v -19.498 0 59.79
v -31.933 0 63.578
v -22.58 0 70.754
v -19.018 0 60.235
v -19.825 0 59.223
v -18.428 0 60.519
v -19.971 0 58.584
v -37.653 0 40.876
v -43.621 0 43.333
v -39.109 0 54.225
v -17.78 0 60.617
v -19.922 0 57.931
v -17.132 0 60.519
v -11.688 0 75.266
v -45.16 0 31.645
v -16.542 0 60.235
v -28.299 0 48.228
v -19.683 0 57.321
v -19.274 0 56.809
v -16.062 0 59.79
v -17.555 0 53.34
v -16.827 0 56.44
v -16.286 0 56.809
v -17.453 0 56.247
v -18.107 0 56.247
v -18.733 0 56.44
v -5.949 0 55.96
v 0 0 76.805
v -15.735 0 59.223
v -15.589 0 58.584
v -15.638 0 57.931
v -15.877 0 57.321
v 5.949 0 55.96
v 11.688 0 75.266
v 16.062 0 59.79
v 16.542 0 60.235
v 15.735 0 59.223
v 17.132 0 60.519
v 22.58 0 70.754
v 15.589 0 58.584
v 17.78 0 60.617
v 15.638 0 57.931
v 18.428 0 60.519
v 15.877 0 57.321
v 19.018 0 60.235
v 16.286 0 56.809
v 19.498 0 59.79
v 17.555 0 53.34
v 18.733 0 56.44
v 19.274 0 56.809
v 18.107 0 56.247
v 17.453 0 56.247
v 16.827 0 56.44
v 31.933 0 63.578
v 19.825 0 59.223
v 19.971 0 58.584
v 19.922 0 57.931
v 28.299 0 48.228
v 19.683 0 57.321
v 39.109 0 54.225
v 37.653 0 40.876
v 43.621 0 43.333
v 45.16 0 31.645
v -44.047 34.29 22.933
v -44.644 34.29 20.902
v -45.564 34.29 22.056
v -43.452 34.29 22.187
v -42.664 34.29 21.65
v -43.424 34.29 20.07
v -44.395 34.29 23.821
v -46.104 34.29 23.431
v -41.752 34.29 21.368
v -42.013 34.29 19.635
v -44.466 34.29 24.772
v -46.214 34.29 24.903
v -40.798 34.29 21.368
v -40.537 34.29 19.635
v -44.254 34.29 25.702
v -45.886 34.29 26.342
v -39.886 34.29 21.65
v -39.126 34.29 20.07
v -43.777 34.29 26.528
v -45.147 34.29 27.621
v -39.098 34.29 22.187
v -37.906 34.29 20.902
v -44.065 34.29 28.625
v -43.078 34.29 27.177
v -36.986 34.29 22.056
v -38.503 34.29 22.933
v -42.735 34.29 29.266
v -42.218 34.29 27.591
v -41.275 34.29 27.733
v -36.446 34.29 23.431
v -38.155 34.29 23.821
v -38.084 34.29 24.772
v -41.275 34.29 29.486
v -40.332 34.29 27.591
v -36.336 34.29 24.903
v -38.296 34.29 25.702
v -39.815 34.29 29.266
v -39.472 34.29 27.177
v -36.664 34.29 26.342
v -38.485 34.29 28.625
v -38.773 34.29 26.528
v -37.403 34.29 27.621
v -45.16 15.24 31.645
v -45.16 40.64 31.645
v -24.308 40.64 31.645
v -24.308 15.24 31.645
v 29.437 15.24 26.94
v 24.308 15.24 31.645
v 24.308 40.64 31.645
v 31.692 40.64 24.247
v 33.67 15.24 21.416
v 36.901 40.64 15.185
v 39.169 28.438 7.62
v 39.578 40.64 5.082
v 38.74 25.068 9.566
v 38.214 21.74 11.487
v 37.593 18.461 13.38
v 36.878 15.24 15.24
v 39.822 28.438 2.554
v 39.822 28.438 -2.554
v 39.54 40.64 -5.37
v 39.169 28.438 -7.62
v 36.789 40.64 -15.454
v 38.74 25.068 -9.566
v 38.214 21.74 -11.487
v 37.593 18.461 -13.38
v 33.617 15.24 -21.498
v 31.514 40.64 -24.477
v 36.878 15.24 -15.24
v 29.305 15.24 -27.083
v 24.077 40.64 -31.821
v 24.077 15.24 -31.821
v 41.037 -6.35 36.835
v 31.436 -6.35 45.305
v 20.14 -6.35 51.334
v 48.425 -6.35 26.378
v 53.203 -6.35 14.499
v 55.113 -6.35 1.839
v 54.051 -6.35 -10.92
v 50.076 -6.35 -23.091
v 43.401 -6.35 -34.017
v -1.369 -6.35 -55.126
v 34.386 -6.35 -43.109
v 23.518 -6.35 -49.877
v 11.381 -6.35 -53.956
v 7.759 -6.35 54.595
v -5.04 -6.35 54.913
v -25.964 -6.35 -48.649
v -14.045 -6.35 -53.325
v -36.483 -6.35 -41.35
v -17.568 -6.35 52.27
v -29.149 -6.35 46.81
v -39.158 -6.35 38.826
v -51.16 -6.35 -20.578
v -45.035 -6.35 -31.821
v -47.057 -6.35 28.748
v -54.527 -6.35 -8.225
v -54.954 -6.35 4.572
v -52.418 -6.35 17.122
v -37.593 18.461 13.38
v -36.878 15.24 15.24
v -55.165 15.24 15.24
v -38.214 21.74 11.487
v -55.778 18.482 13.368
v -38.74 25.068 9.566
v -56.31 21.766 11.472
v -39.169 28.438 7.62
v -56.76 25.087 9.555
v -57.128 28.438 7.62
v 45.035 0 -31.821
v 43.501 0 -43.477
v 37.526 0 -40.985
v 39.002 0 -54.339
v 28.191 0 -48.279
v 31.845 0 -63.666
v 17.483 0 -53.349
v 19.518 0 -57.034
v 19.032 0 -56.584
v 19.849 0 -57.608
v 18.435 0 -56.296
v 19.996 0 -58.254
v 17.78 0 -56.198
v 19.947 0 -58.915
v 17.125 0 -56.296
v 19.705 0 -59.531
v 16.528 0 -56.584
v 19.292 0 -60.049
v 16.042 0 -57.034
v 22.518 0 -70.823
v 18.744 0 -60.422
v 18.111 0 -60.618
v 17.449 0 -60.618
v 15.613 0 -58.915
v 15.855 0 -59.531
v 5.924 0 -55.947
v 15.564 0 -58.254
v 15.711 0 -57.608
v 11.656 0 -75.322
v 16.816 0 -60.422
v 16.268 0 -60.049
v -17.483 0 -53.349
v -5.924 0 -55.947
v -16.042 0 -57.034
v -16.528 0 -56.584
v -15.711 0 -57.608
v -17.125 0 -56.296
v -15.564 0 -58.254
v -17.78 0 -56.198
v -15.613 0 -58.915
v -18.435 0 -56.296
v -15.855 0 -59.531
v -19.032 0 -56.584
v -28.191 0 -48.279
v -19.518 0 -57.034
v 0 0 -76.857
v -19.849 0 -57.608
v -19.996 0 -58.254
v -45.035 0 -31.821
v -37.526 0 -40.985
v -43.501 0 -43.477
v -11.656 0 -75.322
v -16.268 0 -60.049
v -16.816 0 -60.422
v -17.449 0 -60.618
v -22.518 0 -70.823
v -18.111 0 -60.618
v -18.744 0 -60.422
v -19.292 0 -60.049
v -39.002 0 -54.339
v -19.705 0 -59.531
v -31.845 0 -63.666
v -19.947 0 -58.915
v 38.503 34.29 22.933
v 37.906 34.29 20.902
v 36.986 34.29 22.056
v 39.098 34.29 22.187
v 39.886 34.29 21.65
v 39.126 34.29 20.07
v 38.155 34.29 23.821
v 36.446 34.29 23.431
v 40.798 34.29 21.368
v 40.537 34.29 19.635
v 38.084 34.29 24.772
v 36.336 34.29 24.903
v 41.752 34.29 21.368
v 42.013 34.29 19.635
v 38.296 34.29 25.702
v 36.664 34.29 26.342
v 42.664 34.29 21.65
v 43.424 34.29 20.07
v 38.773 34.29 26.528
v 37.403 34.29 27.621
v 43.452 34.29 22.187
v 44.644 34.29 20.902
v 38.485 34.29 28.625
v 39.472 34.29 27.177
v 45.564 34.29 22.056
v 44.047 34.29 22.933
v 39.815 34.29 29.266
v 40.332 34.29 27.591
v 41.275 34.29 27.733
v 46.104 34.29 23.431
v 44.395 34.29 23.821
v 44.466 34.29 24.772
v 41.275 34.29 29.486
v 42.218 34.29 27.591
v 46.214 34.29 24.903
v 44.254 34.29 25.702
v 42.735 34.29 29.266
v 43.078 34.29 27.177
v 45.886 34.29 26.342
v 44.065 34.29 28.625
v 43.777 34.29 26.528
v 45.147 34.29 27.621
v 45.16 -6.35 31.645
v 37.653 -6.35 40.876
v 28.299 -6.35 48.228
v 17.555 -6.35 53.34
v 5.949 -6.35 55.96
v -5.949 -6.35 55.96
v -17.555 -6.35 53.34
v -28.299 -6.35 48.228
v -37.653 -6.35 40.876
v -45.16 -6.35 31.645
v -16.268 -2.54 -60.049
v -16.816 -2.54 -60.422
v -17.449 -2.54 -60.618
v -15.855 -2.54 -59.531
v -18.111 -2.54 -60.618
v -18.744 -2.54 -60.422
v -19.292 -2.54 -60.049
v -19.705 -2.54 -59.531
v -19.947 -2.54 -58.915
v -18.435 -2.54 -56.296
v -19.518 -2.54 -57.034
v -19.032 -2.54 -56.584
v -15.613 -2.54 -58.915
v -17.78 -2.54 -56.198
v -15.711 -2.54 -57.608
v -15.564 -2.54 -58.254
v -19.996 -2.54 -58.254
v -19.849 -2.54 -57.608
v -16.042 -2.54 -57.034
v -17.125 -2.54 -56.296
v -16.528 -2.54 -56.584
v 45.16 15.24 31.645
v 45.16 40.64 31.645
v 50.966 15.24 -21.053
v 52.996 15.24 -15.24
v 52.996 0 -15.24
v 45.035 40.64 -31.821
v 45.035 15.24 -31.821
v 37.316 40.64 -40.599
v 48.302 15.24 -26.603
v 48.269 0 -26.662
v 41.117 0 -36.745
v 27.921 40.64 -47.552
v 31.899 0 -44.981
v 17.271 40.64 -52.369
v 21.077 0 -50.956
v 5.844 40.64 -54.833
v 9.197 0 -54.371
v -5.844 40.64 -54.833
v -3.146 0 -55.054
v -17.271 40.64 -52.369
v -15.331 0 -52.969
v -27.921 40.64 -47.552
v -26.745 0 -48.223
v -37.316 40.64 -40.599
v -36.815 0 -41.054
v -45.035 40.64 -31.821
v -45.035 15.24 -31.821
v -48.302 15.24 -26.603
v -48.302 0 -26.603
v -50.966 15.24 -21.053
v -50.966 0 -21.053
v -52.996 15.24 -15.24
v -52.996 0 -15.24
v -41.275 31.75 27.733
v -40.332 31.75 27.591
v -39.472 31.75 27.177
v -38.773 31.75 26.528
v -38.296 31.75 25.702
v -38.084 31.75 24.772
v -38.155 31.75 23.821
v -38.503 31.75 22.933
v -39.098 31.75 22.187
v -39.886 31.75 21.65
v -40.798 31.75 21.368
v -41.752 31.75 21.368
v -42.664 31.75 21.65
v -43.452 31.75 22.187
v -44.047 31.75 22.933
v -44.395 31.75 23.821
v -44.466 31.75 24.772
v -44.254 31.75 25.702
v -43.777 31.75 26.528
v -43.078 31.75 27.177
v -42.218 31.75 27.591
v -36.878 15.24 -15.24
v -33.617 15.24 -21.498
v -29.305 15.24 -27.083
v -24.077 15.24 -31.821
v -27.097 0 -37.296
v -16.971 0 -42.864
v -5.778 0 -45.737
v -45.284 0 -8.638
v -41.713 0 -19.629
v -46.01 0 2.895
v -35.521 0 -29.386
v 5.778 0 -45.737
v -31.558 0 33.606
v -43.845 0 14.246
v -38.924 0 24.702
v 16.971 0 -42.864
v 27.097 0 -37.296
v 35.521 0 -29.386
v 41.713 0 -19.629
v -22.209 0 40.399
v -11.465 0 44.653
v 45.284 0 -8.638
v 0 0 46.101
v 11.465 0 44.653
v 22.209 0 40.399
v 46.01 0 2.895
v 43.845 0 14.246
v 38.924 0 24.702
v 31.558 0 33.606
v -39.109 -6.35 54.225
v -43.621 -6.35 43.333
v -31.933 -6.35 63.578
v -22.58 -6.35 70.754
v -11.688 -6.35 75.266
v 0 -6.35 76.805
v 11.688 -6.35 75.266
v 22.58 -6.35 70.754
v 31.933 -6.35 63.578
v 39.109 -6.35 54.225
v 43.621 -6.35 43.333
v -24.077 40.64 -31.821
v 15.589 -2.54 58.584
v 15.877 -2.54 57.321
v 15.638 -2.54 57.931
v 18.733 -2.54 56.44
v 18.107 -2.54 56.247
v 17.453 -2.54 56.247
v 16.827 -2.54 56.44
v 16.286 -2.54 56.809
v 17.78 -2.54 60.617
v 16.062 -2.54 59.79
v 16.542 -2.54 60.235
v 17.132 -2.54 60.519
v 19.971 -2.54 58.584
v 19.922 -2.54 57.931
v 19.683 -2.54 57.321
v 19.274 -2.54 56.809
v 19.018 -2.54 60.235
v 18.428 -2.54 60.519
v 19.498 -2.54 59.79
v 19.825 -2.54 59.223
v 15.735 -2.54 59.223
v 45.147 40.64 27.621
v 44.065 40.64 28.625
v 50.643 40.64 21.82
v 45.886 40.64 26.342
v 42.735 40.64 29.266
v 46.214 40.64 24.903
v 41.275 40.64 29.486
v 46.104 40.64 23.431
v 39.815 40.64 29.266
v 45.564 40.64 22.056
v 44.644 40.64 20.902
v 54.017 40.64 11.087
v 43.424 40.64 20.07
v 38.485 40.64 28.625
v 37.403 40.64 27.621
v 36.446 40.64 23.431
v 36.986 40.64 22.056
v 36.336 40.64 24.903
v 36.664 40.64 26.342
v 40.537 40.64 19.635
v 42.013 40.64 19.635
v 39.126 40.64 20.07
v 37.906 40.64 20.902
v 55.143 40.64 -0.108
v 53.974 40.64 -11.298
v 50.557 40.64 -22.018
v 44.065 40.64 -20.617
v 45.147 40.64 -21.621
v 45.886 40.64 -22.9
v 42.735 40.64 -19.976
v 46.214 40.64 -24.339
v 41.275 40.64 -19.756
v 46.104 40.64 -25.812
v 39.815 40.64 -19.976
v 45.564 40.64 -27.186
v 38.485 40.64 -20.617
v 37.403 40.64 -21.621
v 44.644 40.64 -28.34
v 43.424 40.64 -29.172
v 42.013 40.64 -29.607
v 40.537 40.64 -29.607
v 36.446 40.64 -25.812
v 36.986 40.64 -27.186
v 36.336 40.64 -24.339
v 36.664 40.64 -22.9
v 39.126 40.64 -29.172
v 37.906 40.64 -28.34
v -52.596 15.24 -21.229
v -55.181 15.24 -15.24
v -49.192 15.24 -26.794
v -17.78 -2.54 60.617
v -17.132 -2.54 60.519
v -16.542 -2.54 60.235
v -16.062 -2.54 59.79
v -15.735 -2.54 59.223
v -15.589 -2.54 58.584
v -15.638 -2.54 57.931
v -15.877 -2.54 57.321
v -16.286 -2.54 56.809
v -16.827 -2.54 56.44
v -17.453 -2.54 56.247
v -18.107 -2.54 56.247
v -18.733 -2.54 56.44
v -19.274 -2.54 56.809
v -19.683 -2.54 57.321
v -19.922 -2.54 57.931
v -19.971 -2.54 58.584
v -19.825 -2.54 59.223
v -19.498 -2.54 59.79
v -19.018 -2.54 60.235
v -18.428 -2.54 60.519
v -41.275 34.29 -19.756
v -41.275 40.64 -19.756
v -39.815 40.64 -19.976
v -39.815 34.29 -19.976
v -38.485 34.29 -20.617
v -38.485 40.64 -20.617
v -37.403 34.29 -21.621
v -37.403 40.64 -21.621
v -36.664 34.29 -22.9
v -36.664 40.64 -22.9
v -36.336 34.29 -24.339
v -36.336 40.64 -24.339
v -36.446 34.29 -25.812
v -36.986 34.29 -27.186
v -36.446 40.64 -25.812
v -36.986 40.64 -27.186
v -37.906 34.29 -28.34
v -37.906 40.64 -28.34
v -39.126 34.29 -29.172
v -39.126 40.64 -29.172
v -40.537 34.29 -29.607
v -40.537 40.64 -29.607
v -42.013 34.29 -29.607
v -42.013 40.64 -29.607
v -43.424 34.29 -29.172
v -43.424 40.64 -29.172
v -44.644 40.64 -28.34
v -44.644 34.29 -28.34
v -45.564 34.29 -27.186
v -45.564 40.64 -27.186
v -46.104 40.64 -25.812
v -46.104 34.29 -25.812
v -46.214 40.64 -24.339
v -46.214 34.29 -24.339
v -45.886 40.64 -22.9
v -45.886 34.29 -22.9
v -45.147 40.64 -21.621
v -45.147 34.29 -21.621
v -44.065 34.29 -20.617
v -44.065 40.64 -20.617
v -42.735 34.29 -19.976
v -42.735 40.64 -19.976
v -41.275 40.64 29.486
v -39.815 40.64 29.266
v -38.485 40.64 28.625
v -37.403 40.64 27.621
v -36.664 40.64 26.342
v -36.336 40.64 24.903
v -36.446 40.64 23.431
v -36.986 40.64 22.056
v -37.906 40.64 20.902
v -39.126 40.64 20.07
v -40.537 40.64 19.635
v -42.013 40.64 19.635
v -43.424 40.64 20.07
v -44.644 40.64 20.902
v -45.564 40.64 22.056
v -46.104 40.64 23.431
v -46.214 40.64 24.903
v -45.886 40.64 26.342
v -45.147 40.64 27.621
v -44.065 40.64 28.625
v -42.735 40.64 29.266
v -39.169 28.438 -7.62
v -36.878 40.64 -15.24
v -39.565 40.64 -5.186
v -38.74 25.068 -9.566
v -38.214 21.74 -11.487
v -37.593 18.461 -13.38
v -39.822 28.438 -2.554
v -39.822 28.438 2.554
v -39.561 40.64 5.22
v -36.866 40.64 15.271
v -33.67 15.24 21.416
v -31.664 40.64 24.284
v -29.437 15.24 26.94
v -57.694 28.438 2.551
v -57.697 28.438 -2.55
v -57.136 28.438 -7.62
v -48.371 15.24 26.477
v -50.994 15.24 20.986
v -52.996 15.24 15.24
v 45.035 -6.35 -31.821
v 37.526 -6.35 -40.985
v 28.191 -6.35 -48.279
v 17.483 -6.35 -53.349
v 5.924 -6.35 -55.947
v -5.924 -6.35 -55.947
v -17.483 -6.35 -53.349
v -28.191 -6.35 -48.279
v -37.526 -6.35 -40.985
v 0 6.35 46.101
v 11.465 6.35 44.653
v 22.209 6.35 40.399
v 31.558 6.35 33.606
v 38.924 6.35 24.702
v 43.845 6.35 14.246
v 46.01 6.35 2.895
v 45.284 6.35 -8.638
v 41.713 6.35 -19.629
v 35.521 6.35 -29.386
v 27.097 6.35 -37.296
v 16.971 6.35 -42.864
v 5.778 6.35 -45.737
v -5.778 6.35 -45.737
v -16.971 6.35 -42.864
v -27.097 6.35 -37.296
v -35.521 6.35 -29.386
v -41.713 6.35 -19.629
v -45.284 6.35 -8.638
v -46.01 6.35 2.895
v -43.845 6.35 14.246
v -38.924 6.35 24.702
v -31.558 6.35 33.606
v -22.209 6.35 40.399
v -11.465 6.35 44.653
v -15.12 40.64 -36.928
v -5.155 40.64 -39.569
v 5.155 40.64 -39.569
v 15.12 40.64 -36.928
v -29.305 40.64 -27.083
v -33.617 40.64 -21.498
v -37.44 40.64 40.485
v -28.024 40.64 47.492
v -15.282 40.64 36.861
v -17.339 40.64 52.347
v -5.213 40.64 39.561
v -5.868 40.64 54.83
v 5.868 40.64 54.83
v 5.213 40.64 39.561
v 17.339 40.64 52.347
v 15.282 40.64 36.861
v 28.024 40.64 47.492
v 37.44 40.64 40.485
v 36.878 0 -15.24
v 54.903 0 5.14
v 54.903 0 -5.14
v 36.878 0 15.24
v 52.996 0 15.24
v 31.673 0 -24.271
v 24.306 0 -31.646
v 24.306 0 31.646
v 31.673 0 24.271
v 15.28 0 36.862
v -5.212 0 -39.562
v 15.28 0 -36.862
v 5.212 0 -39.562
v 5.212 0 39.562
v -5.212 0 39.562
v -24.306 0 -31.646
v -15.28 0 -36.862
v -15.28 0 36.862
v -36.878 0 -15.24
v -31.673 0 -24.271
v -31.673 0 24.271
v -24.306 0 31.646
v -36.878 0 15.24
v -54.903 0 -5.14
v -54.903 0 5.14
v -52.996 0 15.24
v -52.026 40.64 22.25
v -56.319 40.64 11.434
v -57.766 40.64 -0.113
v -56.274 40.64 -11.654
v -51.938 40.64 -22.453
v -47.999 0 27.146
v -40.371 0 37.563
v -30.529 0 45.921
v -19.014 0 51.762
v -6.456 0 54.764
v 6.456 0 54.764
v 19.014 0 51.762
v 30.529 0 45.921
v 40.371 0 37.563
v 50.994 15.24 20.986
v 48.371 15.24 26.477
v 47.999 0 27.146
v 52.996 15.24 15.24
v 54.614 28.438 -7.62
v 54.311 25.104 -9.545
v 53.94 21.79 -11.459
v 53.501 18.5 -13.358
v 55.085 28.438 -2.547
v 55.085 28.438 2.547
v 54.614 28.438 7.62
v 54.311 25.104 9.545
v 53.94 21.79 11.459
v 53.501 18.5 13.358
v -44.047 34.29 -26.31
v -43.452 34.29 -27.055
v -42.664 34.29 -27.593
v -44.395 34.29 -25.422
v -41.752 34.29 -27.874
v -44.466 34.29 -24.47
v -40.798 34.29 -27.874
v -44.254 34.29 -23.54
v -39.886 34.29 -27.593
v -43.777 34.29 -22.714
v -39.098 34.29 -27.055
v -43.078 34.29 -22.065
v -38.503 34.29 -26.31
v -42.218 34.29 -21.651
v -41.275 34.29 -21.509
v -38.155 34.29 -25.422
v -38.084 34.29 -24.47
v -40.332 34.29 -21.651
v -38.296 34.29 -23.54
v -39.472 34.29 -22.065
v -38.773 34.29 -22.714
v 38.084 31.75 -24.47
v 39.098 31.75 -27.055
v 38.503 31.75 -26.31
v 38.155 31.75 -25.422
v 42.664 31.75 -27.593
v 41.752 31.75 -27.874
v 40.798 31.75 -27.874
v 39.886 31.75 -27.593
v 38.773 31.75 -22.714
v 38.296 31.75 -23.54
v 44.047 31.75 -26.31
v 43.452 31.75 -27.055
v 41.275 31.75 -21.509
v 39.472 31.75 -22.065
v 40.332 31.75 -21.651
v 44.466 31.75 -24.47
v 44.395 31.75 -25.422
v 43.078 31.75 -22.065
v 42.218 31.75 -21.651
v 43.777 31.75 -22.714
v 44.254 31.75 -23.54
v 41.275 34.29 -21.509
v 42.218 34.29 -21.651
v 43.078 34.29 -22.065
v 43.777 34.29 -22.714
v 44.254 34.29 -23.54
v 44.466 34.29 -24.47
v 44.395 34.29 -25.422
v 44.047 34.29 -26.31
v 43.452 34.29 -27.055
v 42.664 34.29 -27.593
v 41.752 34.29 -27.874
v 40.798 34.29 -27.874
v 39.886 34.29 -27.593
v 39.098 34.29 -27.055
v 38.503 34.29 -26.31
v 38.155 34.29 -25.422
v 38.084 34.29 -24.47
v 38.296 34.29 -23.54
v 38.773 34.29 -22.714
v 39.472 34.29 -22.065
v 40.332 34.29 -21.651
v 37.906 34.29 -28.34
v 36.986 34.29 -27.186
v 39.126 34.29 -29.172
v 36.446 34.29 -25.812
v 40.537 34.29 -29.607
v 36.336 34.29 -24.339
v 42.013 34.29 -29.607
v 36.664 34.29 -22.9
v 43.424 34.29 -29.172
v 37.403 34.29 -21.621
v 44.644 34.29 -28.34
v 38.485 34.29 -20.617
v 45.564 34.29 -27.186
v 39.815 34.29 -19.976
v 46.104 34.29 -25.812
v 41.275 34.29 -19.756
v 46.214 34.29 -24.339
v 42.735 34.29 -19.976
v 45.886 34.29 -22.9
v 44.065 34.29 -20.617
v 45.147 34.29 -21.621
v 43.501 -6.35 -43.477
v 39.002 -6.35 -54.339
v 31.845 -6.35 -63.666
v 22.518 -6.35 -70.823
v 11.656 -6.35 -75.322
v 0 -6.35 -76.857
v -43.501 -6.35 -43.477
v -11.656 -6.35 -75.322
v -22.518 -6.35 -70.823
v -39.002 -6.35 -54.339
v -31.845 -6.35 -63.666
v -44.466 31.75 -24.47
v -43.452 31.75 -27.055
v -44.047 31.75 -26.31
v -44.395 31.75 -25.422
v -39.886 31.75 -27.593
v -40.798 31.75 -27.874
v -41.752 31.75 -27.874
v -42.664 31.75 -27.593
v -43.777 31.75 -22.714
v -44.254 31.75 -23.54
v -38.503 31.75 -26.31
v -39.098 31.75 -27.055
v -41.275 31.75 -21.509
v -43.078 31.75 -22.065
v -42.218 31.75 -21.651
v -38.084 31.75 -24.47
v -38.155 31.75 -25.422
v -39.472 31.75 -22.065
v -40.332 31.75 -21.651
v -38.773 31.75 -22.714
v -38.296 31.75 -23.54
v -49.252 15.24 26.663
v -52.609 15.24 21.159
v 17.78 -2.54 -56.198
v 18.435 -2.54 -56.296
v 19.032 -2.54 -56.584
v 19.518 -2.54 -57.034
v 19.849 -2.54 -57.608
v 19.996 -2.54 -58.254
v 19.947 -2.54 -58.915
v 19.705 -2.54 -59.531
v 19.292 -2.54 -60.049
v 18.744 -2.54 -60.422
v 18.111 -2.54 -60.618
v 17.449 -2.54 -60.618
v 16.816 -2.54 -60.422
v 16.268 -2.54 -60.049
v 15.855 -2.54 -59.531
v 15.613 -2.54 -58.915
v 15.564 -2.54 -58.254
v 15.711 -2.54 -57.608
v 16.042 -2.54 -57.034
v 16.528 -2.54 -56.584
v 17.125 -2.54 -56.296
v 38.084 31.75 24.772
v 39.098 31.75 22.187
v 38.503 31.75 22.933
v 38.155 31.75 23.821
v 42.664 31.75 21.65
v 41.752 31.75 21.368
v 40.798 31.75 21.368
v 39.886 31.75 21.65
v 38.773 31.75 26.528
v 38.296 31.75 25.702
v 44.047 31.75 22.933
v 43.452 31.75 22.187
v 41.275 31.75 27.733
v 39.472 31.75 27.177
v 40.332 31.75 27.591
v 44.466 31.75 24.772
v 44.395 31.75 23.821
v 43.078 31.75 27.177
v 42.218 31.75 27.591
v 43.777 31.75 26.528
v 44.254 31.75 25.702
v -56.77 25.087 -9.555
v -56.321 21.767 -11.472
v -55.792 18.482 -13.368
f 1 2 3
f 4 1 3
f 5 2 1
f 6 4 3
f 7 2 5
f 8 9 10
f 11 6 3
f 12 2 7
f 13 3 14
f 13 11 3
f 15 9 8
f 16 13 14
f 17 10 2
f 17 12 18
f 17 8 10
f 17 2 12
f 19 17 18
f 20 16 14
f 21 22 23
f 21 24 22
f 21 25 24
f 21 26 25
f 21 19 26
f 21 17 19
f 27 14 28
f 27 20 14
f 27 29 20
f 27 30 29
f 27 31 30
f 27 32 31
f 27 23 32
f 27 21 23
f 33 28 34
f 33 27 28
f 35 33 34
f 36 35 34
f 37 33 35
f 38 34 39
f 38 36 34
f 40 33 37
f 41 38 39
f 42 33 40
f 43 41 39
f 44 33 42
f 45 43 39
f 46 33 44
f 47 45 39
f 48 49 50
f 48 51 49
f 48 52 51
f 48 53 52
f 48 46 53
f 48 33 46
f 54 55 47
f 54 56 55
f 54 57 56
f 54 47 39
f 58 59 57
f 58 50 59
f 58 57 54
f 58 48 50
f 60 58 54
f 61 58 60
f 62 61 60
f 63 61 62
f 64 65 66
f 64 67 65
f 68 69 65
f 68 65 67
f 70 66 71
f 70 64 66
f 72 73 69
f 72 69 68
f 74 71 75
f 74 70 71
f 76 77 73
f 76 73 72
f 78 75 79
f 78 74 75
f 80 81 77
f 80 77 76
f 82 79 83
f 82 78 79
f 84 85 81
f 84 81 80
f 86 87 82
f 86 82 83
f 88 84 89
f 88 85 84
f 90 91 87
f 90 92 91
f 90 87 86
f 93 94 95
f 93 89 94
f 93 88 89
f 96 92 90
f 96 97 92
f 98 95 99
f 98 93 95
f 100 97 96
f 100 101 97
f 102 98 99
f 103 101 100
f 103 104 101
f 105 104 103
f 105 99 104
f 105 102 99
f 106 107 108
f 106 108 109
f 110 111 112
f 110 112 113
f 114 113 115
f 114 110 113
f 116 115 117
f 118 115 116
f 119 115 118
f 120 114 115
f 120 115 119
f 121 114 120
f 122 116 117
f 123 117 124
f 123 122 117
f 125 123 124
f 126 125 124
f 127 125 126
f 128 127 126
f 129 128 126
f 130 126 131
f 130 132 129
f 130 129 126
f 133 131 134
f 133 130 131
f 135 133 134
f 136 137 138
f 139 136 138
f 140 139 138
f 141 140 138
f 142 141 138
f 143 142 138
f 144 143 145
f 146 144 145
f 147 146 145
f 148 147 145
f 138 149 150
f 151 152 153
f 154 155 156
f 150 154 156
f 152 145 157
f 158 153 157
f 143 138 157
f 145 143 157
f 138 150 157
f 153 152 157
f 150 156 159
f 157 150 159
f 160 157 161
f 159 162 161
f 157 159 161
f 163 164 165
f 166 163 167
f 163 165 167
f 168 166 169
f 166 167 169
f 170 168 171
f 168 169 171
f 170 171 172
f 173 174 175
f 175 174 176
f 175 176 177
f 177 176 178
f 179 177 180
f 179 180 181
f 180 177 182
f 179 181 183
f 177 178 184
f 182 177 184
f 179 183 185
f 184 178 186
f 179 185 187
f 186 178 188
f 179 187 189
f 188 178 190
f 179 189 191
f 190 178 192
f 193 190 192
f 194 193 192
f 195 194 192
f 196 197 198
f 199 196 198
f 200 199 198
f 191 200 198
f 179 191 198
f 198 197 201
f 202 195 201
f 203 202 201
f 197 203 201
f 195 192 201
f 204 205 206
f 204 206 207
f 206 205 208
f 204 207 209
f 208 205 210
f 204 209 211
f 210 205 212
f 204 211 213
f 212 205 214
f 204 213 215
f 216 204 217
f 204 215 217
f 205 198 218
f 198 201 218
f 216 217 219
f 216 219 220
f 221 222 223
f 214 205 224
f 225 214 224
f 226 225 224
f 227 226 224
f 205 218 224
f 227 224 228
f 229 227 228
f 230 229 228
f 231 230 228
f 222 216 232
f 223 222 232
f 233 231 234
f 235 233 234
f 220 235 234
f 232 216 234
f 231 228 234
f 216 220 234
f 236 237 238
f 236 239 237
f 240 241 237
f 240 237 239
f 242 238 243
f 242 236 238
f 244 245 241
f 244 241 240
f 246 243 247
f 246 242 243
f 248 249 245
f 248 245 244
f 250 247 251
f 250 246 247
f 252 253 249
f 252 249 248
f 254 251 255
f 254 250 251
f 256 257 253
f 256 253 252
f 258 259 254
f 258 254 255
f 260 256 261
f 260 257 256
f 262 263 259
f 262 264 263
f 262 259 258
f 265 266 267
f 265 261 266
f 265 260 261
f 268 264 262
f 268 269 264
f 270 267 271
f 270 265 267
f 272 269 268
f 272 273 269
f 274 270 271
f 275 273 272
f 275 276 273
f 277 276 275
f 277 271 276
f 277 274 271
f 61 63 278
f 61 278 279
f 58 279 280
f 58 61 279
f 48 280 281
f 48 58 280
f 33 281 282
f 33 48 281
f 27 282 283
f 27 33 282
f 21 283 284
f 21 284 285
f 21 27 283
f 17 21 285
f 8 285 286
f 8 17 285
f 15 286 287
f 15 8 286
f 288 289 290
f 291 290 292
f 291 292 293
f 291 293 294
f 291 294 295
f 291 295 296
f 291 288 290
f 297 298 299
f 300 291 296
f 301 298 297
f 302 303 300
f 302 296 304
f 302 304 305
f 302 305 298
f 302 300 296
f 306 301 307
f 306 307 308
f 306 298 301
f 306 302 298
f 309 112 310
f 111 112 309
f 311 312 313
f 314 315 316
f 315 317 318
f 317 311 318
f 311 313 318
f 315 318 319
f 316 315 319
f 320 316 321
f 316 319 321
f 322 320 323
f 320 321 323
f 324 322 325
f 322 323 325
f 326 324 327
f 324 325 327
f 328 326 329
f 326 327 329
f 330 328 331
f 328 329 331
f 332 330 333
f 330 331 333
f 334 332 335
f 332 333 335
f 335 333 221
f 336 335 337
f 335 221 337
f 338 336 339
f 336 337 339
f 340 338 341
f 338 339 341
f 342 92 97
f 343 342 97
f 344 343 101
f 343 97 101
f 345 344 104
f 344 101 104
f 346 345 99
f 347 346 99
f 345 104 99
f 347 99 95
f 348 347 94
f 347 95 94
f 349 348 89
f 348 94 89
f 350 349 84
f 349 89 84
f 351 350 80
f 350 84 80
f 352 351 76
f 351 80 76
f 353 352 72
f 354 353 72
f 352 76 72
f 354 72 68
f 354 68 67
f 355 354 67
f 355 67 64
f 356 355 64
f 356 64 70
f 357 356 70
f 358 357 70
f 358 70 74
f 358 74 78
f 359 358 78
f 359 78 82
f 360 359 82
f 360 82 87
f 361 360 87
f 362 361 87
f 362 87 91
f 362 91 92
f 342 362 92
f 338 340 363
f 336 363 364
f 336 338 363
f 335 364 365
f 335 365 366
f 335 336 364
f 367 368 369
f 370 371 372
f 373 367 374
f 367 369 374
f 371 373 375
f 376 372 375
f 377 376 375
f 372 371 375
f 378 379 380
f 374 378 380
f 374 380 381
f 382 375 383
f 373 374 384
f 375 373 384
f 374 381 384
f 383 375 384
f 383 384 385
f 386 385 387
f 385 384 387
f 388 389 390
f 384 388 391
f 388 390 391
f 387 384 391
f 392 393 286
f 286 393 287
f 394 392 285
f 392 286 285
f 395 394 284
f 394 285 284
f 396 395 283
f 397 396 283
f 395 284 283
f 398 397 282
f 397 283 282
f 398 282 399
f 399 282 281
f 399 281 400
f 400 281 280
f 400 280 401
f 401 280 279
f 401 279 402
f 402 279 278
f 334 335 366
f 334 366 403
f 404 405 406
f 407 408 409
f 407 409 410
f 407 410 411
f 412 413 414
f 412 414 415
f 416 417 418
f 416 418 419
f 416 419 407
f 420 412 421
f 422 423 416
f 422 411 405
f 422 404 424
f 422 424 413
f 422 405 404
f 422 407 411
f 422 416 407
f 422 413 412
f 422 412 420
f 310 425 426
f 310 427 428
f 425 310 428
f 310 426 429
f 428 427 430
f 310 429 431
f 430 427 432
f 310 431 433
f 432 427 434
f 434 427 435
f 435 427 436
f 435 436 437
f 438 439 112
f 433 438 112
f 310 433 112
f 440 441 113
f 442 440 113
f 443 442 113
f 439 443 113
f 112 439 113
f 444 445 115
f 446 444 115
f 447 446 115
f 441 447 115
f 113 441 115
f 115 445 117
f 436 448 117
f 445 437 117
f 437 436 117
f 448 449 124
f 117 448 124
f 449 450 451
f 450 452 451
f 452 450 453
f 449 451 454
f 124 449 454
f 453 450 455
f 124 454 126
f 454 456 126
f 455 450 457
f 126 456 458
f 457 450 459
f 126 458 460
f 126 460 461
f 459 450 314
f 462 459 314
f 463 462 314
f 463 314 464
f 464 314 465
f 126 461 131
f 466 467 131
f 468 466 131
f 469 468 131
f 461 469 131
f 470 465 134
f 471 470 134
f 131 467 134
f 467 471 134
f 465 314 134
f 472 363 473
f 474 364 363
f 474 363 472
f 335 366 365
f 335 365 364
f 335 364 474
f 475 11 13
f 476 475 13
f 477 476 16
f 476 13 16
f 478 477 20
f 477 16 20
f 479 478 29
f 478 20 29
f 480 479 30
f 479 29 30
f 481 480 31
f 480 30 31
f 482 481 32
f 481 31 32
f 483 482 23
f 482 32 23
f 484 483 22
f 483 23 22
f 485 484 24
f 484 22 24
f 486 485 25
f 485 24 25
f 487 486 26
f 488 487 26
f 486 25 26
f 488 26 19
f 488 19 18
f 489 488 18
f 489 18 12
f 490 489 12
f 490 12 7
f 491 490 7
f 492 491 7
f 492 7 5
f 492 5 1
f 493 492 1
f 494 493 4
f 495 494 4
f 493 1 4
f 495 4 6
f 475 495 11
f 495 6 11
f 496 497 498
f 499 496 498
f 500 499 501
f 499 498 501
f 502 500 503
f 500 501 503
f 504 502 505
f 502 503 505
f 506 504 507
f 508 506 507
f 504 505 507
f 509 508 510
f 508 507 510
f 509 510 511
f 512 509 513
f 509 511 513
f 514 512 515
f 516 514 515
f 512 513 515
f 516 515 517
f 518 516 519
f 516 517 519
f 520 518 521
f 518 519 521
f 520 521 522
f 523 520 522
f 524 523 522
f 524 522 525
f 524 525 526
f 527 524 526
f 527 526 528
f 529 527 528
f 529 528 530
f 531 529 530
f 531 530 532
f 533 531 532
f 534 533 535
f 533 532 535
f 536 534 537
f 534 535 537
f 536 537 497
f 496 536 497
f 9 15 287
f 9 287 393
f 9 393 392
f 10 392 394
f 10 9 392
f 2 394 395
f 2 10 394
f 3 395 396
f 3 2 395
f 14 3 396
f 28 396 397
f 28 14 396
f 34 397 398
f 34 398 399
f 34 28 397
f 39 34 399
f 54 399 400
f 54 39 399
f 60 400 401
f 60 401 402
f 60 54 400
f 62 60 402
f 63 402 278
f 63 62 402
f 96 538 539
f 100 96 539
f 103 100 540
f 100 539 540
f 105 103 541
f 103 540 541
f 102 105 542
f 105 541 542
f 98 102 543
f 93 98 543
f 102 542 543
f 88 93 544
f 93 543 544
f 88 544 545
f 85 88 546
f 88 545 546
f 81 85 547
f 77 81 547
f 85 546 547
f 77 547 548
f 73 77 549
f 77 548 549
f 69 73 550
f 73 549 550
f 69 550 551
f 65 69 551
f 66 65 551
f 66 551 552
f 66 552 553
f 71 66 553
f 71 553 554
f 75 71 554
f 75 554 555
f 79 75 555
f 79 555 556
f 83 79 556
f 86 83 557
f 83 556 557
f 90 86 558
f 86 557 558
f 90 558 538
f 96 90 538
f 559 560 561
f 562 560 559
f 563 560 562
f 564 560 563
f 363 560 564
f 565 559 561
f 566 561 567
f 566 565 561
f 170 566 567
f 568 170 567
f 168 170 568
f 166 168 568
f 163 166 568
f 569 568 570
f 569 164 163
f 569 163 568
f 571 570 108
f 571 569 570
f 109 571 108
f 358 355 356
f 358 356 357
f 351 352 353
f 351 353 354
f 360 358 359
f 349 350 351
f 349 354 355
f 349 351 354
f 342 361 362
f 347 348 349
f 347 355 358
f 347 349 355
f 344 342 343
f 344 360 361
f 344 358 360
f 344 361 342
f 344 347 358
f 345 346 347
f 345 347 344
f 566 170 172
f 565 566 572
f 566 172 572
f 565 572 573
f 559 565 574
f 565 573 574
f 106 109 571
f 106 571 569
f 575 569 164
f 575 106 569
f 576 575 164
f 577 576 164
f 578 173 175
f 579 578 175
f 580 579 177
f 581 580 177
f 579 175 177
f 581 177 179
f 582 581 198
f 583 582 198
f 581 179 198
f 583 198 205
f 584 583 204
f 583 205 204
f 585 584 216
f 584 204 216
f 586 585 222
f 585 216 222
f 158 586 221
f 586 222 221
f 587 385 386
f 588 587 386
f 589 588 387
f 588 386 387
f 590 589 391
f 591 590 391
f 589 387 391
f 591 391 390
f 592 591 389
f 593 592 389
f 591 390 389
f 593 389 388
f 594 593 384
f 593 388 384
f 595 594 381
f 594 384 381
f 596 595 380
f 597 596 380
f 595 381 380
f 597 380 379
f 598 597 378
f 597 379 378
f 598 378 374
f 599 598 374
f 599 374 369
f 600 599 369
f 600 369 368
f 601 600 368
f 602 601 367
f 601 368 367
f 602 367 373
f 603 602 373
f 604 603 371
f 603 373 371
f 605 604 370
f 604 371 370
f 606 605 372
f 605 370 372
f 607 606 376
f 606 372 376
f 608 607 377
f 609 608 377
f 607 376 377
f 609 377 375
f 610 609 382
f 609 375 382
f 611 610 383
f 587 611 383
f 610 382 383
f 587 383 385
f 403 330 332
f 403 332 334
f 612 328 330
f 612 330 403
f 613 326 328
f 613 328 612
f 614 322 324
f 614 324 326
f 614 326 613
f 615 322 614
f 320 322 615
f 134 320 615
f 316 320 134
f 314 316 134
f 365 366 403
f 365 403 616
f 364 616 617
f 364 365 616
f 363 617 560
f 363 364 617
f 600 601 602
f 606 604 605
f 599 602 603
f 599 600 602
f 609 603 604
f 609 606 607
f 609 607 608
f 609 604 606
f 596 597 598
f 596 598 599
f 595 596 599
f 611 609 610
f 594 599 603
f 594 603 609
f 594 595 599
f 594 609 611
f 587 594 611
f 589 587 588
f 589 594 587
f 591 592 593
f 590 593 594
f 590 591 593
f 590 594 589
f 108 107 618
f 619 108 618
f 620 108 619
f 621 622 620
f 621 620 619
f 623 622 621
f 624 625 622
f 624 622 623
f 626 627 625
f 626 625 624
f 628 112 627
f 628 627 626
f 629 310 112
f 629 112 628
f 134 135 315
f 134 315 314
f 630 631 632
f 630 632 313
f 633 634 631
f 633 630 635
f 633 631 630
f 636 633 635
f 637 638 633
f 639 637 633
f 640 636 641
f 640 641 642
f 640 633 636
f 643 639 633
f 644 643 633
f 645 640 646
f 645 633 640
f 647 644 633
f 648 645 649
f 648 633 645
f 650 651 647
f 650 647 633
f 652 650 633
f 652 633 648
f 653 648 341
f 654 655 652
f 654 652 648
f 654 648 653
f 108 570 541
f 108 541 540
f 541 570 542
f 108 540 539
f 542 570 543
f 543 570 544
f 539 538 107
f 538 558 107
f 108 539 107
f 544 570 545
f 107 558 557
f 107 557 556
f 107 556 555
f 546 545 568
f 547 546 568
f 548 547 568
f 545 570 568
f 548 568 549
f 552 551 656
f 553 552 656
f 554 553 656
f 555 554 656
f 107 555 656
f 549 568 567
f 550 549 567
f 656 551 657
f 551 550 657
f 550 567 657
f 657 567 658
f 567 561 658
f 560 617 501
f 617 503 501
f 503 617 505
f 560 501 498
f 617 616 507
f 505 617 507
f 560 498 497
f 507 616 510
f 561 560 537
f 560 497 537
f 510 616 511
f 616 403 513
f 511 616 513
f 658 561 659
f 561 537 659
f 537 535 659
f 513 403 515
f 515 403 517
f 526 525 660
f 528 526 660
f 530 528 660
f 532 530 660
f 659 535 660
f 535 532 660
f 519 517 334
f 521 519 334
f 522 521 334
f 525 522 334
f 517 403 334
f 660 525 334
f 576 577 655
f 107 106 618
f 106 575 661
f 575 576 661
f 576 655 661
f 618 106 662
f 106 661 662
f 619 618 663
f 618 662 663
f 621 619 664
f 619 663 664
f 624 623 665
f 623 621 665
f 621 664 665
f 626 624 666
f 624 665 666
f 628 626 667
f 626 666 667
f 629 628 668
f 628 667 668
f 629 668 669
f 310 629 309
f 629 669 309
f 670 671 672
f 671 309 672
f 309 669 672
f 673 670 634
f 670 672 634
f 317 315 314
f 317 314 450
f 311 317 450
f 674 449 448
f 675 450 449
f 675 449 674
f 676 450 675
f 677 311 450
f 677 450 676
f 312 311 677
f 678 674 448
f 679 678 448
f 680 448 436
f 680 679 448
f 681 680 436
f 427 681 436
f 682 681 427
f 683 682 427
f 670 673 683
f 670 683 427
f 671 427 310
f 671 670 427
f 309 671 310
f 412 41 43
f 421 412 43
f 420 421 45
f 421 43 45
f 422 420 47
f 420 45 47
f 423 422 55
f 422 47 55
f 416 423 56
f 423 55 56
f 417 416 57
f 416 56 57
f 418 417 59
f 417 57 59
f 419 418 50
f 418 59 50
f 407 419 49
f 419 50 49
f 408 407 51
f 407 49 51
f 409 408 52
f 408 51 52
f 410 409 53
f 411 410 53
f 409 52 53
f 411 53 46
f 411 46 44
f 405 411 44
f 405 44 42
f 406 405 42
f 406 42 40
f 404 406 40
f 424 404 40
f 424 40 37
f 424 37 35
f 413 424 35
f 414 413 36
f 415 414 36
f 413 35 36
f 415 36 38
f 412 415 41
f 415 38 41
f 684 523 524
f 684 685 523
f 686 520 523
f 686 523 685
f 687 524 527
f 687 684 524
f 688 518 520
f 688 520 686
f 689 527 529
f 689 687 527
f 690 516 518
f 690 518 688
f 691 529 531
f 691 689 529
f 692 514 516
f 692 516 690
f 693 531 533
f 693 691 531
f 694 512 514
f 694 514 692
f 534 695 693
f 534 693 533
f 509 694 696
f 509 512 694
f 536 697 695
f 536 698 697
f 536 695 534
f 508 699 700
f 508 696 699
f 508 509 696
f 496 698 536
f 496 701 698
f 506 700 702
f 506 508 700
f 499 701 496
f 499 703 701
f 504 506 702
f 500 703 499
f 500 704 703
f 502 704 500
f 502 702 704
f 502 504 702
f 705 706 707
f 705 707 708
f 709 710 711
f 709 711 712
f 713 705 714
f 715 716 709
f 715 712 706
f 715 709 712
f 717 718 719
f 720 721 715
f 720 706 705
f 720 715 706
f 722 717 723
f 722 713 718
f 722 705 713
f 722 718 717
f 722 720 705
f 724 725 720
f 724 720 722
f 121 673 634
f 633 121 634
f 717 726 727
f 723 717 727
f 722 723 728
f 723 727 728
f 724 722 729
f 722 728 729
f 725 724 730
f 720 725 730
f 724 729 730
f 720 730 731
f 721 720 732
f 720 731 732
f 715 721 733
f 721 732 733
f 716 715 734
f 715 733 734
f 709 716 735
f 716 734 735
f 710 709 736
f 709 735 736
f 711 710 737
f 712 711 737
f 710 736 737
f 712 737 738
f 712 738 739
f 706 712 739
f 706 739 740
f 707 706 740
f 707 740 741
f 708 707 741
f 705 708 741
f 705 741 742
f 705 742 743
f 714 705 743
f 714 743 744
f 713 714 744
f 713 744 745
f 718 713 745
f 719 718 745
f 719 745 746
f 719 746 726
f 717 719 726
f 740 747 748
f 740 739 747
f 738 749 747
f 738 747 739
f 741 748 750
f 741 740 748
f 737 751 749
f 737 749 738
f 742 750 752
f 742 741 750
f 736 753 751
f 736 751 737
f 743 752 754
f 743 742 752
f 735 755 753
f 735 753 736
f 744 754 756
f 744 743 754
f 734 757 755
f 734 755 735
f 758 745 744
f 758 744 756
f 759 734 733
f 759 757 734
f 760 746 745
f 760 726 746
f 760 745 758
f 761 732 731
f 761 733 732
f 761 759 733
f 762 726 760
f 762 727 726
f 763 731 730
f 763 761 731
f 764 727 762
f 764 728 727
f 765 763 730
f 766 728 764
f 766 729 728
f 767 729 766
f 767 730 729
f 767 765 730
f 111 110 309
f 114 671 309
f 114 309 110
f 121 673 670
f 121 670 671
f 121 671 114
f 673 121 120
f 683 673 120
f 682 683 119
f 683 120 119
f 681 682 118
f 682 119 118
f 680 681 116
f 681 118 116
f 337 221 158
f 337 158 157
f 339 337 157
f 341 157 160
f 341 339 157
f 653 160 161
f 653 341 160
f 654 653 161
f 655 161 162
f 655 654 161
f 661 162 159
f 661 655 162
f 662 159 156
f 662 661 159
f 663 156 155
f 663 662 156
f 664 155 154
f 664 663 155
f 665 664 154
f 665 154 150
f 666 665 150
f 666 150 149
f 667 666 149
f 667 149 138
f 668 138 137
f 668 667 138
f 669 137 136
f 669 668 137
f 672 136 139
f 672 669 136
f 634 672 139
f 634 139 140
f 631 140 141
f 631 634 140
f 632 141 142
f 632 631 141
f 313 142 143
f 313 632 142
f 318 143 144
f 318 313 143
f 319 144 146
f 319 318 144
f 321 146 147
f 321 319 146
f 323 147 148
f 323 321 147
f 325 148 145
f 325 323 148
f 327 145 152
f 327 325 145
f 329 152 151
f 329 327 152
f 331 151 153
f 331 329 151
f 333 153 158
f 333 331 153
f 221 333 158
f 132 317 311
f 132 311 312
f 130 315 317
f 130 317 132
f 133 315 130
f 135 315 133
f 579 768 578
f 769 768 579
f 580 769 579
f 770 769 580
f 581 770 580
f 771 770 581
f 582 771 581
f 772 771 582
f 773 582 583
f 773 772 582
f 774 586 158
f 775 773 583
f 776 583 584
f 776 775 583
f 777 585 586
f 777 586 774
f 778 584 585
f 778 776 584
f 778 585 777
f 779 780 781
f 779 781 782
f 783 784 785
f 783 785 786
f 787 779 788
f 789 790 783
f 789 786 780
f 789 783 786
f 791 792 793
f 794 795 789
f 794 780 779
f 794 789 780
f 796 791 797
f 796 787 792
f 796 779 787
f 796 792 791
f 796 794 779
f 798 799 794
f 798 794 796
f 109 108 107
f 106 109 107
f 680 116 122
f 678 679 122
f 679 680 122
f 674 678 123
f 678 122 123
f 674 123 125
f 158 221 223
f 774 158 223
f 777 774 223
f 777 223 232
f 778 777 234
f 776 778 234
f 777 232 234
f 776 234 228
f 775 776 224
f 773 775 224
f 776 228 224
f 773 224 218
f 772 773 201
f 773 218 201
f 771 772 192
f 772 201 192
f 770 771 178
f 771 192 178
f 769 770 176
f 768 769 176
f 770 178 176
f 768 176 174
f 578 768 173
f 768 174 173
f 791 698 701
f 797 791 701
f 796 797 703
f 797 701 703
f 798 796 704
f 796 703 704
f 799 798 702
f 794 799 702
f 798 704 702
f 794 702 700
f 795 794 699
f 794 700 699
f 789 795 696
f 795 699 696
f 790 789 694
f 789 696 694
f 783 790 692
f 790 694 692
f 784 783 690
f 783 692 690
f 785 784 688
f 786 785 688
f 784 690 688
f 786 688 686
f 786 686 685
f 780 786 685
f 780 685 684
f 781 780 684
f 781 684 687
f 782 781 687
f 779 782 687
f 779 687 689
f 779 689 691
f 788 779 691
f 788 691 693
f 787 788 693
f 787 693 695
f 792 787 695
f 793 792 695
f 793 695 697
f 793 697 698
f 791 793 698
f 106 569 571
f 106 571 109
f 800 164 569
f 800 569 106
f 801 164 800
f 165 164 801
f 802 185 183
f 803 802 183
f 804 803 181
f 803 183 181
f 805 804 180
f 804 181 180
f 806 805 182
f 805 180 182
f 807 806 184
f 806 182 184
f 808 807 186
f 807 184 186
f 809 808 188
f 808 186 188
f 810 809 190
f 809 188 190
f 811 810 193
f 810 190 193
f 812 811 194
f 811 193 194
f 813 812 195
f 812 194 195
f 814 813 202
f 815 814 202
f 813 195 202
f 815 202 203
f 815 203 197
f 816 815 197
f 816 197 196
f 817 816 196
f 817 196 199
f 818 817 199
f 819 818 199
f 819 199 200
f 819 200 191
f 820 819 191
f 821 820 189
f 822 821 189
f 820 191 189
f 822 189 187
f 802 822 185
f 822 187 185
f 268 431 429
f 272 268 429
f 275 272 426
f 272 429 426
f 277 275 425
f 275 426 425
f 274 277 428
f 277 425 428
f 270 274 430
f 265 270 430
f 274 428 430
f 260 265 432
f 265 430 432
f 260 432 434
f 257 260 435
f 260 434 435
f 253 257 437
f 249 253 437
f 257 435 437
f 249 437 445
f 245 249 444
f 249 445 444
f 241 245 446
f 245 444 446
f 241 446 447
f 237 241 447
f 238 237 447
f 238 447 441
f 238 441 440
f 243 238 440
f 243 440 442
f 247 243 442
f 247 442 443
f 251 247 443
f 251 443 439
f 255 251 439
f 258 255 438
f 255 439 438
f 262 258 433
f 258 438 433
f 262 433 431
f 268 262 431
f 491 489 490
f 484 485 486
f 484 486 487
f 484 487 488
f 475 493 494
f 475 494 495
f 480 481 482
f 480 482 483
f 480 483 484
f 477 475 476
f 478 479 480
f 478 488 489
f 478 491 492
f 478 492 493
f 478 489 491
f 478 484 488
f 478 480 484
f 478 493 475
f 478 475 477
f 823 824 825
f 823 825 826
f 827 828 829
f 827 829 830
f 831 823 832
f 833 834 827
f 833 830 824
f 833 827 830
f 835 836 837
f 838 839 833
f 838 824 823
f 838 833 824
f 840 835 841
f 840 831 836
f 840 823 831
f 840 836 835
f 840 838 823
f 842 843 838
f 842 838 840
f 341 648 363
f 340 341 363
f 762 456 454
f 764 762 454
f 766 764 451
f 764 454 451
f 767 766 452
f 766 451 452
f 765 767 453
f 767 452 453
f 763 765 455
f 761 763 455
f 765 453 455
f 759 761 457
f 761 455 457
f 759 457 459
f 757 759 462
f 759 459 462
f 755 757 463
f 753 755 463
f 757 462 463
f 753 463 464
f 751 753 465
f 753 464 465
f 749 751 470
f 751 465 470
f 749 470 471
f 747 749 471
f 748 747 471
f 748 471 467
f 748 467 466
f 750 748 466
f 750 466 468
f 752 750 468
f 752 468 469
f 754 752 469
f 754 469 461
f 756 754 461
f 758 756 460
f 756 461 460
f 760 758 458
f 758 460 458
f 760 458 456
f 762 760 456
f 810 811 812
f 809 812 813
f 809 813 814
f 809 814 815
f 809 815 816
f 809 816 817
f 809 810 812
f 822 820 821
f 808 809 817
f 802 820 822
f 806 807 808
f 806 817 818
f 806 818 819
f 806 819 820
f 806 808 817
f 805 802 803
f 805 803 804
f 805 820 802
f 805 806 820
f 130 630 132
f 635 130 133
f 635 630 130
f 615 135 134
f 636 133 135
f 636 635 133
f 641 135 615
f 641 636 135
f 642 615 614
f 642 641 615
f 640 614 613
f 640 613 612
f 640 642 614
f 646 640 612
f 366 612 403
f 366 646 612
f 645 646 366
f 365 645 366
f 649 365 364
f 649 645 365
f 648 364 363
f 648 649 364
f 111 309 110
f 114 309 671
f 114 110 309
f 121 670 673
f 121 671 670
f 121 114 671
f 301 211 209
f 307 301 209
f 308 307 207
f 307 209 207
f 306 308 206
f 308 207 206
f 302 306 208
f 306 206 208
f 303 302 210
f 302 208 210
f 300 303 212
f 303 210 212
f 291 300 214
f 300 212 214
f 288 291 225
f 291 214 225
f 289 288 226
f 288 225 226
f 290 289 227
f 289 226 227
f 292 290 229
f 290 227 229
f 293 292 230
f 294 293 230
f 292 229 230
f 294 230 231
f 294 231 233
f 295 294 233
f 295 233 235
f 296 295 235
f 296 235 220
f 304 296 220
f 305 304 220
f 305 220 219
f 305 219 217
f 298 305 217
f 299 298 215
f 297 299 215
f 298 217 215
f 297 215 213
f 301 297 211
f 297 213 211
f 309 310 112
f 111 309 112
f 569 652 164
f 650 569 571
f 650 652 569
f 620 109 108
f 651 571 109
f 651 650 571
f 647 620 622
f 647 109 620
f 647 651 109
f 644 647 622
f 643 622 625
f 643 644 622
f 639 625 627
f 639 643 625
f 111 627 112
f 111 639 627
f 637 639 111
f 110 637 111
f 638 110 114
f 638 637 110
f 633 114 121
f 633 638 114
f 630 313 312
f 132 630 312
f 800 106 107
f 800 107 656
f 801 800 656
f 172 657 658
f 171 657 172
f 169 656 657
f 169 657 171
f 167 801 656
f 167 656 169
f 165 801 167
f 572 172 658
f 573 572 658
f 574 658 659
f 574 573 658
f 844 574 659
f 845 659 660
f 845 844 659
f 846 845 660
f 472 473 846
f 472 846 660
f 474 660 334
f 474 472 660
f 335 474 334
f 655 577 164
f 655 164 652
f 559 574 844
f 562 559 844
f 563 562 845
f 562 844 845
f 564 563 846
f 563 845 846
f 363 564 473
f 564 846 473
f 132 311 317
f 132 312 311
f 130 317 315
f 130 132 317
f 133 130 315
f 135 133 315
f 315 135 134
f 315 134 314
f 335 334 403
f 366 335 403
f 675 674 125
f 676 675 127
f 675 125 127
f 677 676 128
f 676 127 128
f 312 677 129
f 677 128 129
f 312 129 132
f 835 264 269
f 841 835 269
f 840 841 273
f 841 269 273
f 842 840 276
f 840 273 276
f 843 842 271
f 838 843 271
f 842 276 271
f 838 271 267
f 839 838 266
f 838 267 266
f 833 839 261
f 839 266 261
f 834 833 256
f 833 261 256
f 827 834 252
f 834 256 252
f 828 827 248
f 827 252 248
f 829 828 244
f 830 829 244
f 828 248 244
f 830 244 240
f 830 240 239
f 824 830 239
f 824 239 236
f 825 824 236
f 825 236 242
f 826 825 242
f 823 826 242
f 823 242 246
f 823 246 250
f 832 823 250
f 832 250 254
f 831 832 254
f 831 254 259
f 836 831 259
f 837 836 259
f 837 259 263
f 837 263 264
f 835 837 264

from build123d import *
from build123d.topology import SkipClean

# Parameters (mm, degrees)
SKETCH1_R               = 55.1434
SKETCH1_R_2             = 39.9034
BOSS_EXTRUDE1_DEPTH     = 40.64
CUT_EXTRUDE2_DEPTH      = 88.938607717
CUT_EXTRUDE2_DEPTH_BACK = 88.938607717
SKETCH7_R               = 46.101
BOSS_EXTRUDE2_DEPTH     = 6.35
BOSS_EXTRUDE4_DEPTH     = 25.4
BOSS_EXTRUDE6_DEPTH     = 25.4
CUT_EXTRUDE3_DEPTH      = 76.2
CUT_EXTRUDE3_DEPTH_BACK = 76.2
BOSS_EXTRUDE9_DEPTH     = 6.35
BOSS_EXTRUDE9_2_DEPTH   = 6.35
SKETCH1_4_R             = 55.1434
BOSS_EXTRUDE10_DEPTH    = 6.35
SKETCH21_R              = 3.2004
CUT_EXTRUDE4_DEPTH      = 8.89
SKETCH22_R              = 2.1971
SKETCH22_R_2            = 2.2225
CUT_EXTRUDE5_DEPTH      = 2.54
SKETCH27_R              = 4.953
CUT_EXTRUDE6_DEPTH      = 6.35


with BuildPart() as part:
    # Sketch1 → Boss-Extrude1 (new body)
    with BuildSketch(Plane(origin=(0, 0, 0), x_dir=(1, 0, 0), z_dir=(0, 1, 0))):
        with Locations(Location((0, 0, 0), (0, 0, 270))):
            Circle(SKETCH1_R)
        with Locations(Location((0, 0, 0), (0, 0, 270))):
            Circle(SKETCH1_R_2, mode=Mode.SUBTRACT)
    extrude(amount=BOSS_EXTRUDE1_DEPTH)

    # Sketch6 → Cut-Extrude2 (cut, two sides: drawn at the far end of the back side and taken through both)
    with BuildSketch(Plane(origin=(0, 0, 0), x_dir=(0, 0, -1), z_dir=(1, 0, 0)).offset(-CUT_EXTRUDE2_DEPTH_BACK)):
        Polygon((-31.644965026, 242.624199171), (-31.644965026, 40.64), (-31.644965026, 15.24), (-15.24, 15.24), (-15.24, 0), (15.24, 0), (15.24, 15.24), (31.821383578, 15.24), (31.821383578, 40.64), (31.821383578, 242.624199171), (31.821383578, 646.592597512), (-31.644965026, 646.592597512), align=None)
    extrude(amount=CUT_EXTRUDE2_DEPTH + CUT_EXTRUDE2_DEPTH_BACK, mode=Mode.SUBTRACT)


with BuildPart() as cut_extrude2_piece_1:
    # of the separate pieces the step leaves, piece 1, a body of its own (cut_extrude2_pieces)
    add(part.part.solids().sort_by_distance((-52.995631552, 0, 15.24))[0])



with BuildPart() as cut_extrude2_piece_2:
    # of the separate pieces the step leaves, piece 2, a body of its own (cut_extrude2_pieces)
    add(part.part.solids().sort_by_distance((52.995631552, 0, -15.24))[0])


with BuildPart() as body_3:
    # Sketch7 → Boss-Extrude2 (new body)
    with BuildSketch(Plane(origin=(0, 0, 0), x_dir=(1, 0, 0), z_dir=(0, 1, 0))):
        with Locations(Location((0, 0, 0), (0, 0, 270))):
            Circle(SKETCH7_R)
    extrude(amount=BOSS_EXTRUDE2_DEPTH)


with BuildPart() as body_4:
    # Sketch8 → Boss-Extrude4 (new body)
    with BuildSketch(Plane(origin=(0, 15.24, 0), x_dir=(1, 0, 0), z_dir=(0, 1, 0))):
        with BuildLine():
            Line((45.159614171, -31.644965026), (24.307972356, -31.644965026))
            ThreePointArc((24.307972356, -31.644965026), (39.903134753, 0.145493869), (24.076562851, 31.821383578))
            Line((24.076562851, 31.821383578), (45.035476135, 31.821383578))
            ThreePointArc((45.035476135, 31.821383578), (55.143294516, 0.107858423), (45.159614171, -31.644965026))
        make_face()
    extrude(amount=BOSS_EXTRUDE4_DEPTH)


with BuildPart() as body_5:
    # Sketch11 → Boss-Extrude6 (new body)
    with BuildSketch(Plane(origin=(0, 15.24, 0), x_dir=(1, 0, 0), z_dir=(0, 1, 0))):
        with BuildLine():
            Line((-45.035476135, 31.821383578), (-24.076562851, 31.821383578))
            ThreePointArc((-24.076562851, 31.821383578), (-31.585051519, 24.385771509), (-36.878499584, 15.24))
            ThreePointArc((-36.878499584, 15.24), (-38.542133743, -10.333695277), (-24.307972356, -31.644965026))
            Line((-24.307972356, -31.644965026), (-45.159614171, -31.644965026))
            ThreePointArc((-45.159614171, -31.644965026), (-57.766312197, 0.112988957), (-45.035476135, 31.821383578))
        make_face()
    extrude(amount=BOSS_EXTRUDE6_DEPTH)


with BuildPart() as cut_extrude3_tool:
    # Sketch12 → Cut-Extrude3 (new, two sides: drawn at the far end of the back side and taken through both)
    with BuildSketch(Plane(origin=(0, 0, 0), x_dir=(0, 0, -1), z_dir=(1, 0, 0)).offset(-CUT_EXTRUDE3_DEPTH_BACK)):
        Polygon((-15.24, 15.24), (-7.62, 28.438227154), (7.62, 28.438227154), (15.24, 15.24), align=None)
    extrude(amount=CUT_EXTRUDE3_DEPTH + CUT_EXTRUDE3_DEPTH_BACK)


with BuildPart() as body_4_1:
    add(body_4.part)

    # Cut-Extrude3: cut by cut_extrude3_tool
    add(cut_extrude3_tool.part, mode=Mode.SUBTRACT)


with BuildPart() as body_5_1:
    add(body_5.part)

    # Cut-Extrude3: cut by cut_extrude3_tool
    add(cut_extrude3_tool.part, mode=Mode.SUBTRACT)


with BuildPart() as body_6:
    # Sketch16 → Boss-Extrude9 (new body)
    with BuildSketch(Plane(origin=(0, 0, 0), x_dir=(1, 0, 0), z_dir=(0, 1, 0))):
        with BuildLine():
            ThreePointArc((-45.035476135, 31.821383578), (0, 76.856859713), (45.035476135, 31.821383578))
            ThreePointArc((45.035476135, 31.821383578), (0, 56.274479887), (-45.035476135, 31.821383578))
        make_face()
    extrude(amount=-BOSS_EXTRUDE9_DEPTH)


with BuildPart() as body_7:
    # Sketch16 → Boss-Extrude9 2 (new body)
    with BuildSketch(Plane(origin=(0, 0, 0), x_dir=(1, 0, 0), z_dir=(0, 1, 0))):
        with BuildLine():
            ThreePointArc((-45.159614171, -31.644965026), (0, -76.804579197), (45.159614171, -31.644965026))
            ThreePointArc((45.159614171, -31.644965026), (0, -56.290123178), (-45.159614171, -31.644965026))
        make_face()
    extrude(amount=-BOSS_EXTRUDE9_2_DEPTH)


with BuildPart() as cut_extrude2_piece_1_1:
    with SkipClean():  # the faces are left unmerged after this step: merging them gives an invalid solid
        add(cut_extrude2_piece_1.part)

        add(cut_extrude2_piece_2.part)  # Boss-Extrude10 merges Cut-Extrude2 piece 2
        # Sketch1<4> → Boss-Extrude10 (add)
        with BuildSketch(Plane(origin=(0, 0, 0), x_dir=(1, 0, 0), z_dir=(0, 1, 0))):
            with Locations(Location((0, 0, 0), (0, 0, 144.755552859))):
                Circle(SKETCH1_4_R)
        extrude(amount=-BOSS_EXTRUDE10_DEPTH)


with BuildPart() as cut_extrude4_tool:
    # Sketch21 → Cut-Extrude4 (new body)
    with BuildSketch(Plane(origin=(0, 40.64, 0), x_dir=(1, 0, 0), z_dir=(0, 1, 0))):
        with Locations(Location((-41.275, 24.709383578, 0), (0, 0, 270))):
            Circle(SKETCH21_R)
        with Locations(Location((-41.275, -24.532965026, 0), (0, 0, 270))):
            Circle(SKETCH21_R)
        with Locations(Location((41.275, -24.532965026, 0), (0, 0, 270))):
            Circle(SKETCH21_R)
        with Locations(Location((41.275, 24.709383578, 0), (0, 0, 270))):
            Circle(SKETCH21_R)
    extrude(amount=-CUT_EXTRUDE4_DEPTH)


with BuildPart() as body_4_2:
    add(body_4_1.part)

    # Cut-Extrude4: cut by cut_extrude4_tool
    add(cut_extrude4_tool.part, mode=Mode.SUBTRACT)


with BuildPart() as body_5_2:
    add(body_5_1.part)

    # Cut-Extrude4: cut by cut_extrude4_tool
    add(cut_extrude4_tool.part, mode=Mode.SUBTRACT)


with BuildPart() as cut_extrude5_tool:
    # Sketch22 → Cut-Extrude5 (new body)
    with BuildSketch(Plane(origin=(0, 0, 0), x_dir=(1, 0, 0), z_dir=(0, 1, 0))):
        with Locations(Location((17.78, -58.42, 0), (0, 0, 270))):
            Circle(SKETCH22_R)
        with Locations(Location((-17.78, -58.42, 0), (0, 0, 270))):
            Circle(SKETCH22_R)
        with Locations(Location((-17.78, 58.42, 0), (0, 0, 270))):
            Circle(SKETCH22_R_2)
        with Locations(Location((17.78, 58.42, 0), (0, 0, 270))):
            Circle(SKETCH22_R_2)
    extrude(amount=-CUT_EXTRUDE5_DEPTH)


with BuildPart() as body_6_1:
    add(body_6.part)

    # Cut-Extrude5: cut by cut_extrude5_tool
    add(cut_extrude5_tool.part, mode=Mode.SUBTRACT)


with BuildPart() as body_7_1:
    add(body_7.part)

    # Cut-Extrude5: cut by cut_extrude5_tool
    add(cut_extrude5_tool.part, mode=Mode.SUBTRACT)


with BuildPart() as cut_extrude6_tool:
    # Sketch27 → Cut-Extrude6 (new body)
    with BuildSketch(Plane(origin=(0, 40.64, 0), x_dir=(1, 0, 0), z_dir=(0, 1, 0))):
        with Locations(Location((-41.275, 24.709383578, 0), (0, 0, 270))):
            Circle(SKETCH27_R)
        with Locations(Location((-41.275, -24.532965026, 0), (0, 0, 270))):
            Circle(SKETCH27_R)
        with Locations(Location((41.275, -24.532965026, 0), (0, 0, 270))):
            Circle(SKETCH27_R)
        with Locations(Location((41.275, 24.709383578, 0), (0, 0, 270))):
            Circle(SKETCH27_R)
    extrude(amount=-CUT_EXTRUDE6_DEPTH)


with BuildPart() as body_4_3:
    add(body_4_2.part)

    # Cut-Extrude6: cut by cut_extrude6_tool
    add(cut_extrude6_tool.part, mode=Mode.SUBTRACT)


with BuildPart() as body_5_3:
    add(body_5_2.part)

    # Cut-Extrude6: cut by cut_extrude6_tool
    add(cut_extrude6_tool.part, mode=Mode.SUBTRACT)


solid = Compound([body_3.part, cut_extrude2_piece_1_1.part, body_6_1.part, body_7_1.part, body_4_3.part, body_5_3.part])
